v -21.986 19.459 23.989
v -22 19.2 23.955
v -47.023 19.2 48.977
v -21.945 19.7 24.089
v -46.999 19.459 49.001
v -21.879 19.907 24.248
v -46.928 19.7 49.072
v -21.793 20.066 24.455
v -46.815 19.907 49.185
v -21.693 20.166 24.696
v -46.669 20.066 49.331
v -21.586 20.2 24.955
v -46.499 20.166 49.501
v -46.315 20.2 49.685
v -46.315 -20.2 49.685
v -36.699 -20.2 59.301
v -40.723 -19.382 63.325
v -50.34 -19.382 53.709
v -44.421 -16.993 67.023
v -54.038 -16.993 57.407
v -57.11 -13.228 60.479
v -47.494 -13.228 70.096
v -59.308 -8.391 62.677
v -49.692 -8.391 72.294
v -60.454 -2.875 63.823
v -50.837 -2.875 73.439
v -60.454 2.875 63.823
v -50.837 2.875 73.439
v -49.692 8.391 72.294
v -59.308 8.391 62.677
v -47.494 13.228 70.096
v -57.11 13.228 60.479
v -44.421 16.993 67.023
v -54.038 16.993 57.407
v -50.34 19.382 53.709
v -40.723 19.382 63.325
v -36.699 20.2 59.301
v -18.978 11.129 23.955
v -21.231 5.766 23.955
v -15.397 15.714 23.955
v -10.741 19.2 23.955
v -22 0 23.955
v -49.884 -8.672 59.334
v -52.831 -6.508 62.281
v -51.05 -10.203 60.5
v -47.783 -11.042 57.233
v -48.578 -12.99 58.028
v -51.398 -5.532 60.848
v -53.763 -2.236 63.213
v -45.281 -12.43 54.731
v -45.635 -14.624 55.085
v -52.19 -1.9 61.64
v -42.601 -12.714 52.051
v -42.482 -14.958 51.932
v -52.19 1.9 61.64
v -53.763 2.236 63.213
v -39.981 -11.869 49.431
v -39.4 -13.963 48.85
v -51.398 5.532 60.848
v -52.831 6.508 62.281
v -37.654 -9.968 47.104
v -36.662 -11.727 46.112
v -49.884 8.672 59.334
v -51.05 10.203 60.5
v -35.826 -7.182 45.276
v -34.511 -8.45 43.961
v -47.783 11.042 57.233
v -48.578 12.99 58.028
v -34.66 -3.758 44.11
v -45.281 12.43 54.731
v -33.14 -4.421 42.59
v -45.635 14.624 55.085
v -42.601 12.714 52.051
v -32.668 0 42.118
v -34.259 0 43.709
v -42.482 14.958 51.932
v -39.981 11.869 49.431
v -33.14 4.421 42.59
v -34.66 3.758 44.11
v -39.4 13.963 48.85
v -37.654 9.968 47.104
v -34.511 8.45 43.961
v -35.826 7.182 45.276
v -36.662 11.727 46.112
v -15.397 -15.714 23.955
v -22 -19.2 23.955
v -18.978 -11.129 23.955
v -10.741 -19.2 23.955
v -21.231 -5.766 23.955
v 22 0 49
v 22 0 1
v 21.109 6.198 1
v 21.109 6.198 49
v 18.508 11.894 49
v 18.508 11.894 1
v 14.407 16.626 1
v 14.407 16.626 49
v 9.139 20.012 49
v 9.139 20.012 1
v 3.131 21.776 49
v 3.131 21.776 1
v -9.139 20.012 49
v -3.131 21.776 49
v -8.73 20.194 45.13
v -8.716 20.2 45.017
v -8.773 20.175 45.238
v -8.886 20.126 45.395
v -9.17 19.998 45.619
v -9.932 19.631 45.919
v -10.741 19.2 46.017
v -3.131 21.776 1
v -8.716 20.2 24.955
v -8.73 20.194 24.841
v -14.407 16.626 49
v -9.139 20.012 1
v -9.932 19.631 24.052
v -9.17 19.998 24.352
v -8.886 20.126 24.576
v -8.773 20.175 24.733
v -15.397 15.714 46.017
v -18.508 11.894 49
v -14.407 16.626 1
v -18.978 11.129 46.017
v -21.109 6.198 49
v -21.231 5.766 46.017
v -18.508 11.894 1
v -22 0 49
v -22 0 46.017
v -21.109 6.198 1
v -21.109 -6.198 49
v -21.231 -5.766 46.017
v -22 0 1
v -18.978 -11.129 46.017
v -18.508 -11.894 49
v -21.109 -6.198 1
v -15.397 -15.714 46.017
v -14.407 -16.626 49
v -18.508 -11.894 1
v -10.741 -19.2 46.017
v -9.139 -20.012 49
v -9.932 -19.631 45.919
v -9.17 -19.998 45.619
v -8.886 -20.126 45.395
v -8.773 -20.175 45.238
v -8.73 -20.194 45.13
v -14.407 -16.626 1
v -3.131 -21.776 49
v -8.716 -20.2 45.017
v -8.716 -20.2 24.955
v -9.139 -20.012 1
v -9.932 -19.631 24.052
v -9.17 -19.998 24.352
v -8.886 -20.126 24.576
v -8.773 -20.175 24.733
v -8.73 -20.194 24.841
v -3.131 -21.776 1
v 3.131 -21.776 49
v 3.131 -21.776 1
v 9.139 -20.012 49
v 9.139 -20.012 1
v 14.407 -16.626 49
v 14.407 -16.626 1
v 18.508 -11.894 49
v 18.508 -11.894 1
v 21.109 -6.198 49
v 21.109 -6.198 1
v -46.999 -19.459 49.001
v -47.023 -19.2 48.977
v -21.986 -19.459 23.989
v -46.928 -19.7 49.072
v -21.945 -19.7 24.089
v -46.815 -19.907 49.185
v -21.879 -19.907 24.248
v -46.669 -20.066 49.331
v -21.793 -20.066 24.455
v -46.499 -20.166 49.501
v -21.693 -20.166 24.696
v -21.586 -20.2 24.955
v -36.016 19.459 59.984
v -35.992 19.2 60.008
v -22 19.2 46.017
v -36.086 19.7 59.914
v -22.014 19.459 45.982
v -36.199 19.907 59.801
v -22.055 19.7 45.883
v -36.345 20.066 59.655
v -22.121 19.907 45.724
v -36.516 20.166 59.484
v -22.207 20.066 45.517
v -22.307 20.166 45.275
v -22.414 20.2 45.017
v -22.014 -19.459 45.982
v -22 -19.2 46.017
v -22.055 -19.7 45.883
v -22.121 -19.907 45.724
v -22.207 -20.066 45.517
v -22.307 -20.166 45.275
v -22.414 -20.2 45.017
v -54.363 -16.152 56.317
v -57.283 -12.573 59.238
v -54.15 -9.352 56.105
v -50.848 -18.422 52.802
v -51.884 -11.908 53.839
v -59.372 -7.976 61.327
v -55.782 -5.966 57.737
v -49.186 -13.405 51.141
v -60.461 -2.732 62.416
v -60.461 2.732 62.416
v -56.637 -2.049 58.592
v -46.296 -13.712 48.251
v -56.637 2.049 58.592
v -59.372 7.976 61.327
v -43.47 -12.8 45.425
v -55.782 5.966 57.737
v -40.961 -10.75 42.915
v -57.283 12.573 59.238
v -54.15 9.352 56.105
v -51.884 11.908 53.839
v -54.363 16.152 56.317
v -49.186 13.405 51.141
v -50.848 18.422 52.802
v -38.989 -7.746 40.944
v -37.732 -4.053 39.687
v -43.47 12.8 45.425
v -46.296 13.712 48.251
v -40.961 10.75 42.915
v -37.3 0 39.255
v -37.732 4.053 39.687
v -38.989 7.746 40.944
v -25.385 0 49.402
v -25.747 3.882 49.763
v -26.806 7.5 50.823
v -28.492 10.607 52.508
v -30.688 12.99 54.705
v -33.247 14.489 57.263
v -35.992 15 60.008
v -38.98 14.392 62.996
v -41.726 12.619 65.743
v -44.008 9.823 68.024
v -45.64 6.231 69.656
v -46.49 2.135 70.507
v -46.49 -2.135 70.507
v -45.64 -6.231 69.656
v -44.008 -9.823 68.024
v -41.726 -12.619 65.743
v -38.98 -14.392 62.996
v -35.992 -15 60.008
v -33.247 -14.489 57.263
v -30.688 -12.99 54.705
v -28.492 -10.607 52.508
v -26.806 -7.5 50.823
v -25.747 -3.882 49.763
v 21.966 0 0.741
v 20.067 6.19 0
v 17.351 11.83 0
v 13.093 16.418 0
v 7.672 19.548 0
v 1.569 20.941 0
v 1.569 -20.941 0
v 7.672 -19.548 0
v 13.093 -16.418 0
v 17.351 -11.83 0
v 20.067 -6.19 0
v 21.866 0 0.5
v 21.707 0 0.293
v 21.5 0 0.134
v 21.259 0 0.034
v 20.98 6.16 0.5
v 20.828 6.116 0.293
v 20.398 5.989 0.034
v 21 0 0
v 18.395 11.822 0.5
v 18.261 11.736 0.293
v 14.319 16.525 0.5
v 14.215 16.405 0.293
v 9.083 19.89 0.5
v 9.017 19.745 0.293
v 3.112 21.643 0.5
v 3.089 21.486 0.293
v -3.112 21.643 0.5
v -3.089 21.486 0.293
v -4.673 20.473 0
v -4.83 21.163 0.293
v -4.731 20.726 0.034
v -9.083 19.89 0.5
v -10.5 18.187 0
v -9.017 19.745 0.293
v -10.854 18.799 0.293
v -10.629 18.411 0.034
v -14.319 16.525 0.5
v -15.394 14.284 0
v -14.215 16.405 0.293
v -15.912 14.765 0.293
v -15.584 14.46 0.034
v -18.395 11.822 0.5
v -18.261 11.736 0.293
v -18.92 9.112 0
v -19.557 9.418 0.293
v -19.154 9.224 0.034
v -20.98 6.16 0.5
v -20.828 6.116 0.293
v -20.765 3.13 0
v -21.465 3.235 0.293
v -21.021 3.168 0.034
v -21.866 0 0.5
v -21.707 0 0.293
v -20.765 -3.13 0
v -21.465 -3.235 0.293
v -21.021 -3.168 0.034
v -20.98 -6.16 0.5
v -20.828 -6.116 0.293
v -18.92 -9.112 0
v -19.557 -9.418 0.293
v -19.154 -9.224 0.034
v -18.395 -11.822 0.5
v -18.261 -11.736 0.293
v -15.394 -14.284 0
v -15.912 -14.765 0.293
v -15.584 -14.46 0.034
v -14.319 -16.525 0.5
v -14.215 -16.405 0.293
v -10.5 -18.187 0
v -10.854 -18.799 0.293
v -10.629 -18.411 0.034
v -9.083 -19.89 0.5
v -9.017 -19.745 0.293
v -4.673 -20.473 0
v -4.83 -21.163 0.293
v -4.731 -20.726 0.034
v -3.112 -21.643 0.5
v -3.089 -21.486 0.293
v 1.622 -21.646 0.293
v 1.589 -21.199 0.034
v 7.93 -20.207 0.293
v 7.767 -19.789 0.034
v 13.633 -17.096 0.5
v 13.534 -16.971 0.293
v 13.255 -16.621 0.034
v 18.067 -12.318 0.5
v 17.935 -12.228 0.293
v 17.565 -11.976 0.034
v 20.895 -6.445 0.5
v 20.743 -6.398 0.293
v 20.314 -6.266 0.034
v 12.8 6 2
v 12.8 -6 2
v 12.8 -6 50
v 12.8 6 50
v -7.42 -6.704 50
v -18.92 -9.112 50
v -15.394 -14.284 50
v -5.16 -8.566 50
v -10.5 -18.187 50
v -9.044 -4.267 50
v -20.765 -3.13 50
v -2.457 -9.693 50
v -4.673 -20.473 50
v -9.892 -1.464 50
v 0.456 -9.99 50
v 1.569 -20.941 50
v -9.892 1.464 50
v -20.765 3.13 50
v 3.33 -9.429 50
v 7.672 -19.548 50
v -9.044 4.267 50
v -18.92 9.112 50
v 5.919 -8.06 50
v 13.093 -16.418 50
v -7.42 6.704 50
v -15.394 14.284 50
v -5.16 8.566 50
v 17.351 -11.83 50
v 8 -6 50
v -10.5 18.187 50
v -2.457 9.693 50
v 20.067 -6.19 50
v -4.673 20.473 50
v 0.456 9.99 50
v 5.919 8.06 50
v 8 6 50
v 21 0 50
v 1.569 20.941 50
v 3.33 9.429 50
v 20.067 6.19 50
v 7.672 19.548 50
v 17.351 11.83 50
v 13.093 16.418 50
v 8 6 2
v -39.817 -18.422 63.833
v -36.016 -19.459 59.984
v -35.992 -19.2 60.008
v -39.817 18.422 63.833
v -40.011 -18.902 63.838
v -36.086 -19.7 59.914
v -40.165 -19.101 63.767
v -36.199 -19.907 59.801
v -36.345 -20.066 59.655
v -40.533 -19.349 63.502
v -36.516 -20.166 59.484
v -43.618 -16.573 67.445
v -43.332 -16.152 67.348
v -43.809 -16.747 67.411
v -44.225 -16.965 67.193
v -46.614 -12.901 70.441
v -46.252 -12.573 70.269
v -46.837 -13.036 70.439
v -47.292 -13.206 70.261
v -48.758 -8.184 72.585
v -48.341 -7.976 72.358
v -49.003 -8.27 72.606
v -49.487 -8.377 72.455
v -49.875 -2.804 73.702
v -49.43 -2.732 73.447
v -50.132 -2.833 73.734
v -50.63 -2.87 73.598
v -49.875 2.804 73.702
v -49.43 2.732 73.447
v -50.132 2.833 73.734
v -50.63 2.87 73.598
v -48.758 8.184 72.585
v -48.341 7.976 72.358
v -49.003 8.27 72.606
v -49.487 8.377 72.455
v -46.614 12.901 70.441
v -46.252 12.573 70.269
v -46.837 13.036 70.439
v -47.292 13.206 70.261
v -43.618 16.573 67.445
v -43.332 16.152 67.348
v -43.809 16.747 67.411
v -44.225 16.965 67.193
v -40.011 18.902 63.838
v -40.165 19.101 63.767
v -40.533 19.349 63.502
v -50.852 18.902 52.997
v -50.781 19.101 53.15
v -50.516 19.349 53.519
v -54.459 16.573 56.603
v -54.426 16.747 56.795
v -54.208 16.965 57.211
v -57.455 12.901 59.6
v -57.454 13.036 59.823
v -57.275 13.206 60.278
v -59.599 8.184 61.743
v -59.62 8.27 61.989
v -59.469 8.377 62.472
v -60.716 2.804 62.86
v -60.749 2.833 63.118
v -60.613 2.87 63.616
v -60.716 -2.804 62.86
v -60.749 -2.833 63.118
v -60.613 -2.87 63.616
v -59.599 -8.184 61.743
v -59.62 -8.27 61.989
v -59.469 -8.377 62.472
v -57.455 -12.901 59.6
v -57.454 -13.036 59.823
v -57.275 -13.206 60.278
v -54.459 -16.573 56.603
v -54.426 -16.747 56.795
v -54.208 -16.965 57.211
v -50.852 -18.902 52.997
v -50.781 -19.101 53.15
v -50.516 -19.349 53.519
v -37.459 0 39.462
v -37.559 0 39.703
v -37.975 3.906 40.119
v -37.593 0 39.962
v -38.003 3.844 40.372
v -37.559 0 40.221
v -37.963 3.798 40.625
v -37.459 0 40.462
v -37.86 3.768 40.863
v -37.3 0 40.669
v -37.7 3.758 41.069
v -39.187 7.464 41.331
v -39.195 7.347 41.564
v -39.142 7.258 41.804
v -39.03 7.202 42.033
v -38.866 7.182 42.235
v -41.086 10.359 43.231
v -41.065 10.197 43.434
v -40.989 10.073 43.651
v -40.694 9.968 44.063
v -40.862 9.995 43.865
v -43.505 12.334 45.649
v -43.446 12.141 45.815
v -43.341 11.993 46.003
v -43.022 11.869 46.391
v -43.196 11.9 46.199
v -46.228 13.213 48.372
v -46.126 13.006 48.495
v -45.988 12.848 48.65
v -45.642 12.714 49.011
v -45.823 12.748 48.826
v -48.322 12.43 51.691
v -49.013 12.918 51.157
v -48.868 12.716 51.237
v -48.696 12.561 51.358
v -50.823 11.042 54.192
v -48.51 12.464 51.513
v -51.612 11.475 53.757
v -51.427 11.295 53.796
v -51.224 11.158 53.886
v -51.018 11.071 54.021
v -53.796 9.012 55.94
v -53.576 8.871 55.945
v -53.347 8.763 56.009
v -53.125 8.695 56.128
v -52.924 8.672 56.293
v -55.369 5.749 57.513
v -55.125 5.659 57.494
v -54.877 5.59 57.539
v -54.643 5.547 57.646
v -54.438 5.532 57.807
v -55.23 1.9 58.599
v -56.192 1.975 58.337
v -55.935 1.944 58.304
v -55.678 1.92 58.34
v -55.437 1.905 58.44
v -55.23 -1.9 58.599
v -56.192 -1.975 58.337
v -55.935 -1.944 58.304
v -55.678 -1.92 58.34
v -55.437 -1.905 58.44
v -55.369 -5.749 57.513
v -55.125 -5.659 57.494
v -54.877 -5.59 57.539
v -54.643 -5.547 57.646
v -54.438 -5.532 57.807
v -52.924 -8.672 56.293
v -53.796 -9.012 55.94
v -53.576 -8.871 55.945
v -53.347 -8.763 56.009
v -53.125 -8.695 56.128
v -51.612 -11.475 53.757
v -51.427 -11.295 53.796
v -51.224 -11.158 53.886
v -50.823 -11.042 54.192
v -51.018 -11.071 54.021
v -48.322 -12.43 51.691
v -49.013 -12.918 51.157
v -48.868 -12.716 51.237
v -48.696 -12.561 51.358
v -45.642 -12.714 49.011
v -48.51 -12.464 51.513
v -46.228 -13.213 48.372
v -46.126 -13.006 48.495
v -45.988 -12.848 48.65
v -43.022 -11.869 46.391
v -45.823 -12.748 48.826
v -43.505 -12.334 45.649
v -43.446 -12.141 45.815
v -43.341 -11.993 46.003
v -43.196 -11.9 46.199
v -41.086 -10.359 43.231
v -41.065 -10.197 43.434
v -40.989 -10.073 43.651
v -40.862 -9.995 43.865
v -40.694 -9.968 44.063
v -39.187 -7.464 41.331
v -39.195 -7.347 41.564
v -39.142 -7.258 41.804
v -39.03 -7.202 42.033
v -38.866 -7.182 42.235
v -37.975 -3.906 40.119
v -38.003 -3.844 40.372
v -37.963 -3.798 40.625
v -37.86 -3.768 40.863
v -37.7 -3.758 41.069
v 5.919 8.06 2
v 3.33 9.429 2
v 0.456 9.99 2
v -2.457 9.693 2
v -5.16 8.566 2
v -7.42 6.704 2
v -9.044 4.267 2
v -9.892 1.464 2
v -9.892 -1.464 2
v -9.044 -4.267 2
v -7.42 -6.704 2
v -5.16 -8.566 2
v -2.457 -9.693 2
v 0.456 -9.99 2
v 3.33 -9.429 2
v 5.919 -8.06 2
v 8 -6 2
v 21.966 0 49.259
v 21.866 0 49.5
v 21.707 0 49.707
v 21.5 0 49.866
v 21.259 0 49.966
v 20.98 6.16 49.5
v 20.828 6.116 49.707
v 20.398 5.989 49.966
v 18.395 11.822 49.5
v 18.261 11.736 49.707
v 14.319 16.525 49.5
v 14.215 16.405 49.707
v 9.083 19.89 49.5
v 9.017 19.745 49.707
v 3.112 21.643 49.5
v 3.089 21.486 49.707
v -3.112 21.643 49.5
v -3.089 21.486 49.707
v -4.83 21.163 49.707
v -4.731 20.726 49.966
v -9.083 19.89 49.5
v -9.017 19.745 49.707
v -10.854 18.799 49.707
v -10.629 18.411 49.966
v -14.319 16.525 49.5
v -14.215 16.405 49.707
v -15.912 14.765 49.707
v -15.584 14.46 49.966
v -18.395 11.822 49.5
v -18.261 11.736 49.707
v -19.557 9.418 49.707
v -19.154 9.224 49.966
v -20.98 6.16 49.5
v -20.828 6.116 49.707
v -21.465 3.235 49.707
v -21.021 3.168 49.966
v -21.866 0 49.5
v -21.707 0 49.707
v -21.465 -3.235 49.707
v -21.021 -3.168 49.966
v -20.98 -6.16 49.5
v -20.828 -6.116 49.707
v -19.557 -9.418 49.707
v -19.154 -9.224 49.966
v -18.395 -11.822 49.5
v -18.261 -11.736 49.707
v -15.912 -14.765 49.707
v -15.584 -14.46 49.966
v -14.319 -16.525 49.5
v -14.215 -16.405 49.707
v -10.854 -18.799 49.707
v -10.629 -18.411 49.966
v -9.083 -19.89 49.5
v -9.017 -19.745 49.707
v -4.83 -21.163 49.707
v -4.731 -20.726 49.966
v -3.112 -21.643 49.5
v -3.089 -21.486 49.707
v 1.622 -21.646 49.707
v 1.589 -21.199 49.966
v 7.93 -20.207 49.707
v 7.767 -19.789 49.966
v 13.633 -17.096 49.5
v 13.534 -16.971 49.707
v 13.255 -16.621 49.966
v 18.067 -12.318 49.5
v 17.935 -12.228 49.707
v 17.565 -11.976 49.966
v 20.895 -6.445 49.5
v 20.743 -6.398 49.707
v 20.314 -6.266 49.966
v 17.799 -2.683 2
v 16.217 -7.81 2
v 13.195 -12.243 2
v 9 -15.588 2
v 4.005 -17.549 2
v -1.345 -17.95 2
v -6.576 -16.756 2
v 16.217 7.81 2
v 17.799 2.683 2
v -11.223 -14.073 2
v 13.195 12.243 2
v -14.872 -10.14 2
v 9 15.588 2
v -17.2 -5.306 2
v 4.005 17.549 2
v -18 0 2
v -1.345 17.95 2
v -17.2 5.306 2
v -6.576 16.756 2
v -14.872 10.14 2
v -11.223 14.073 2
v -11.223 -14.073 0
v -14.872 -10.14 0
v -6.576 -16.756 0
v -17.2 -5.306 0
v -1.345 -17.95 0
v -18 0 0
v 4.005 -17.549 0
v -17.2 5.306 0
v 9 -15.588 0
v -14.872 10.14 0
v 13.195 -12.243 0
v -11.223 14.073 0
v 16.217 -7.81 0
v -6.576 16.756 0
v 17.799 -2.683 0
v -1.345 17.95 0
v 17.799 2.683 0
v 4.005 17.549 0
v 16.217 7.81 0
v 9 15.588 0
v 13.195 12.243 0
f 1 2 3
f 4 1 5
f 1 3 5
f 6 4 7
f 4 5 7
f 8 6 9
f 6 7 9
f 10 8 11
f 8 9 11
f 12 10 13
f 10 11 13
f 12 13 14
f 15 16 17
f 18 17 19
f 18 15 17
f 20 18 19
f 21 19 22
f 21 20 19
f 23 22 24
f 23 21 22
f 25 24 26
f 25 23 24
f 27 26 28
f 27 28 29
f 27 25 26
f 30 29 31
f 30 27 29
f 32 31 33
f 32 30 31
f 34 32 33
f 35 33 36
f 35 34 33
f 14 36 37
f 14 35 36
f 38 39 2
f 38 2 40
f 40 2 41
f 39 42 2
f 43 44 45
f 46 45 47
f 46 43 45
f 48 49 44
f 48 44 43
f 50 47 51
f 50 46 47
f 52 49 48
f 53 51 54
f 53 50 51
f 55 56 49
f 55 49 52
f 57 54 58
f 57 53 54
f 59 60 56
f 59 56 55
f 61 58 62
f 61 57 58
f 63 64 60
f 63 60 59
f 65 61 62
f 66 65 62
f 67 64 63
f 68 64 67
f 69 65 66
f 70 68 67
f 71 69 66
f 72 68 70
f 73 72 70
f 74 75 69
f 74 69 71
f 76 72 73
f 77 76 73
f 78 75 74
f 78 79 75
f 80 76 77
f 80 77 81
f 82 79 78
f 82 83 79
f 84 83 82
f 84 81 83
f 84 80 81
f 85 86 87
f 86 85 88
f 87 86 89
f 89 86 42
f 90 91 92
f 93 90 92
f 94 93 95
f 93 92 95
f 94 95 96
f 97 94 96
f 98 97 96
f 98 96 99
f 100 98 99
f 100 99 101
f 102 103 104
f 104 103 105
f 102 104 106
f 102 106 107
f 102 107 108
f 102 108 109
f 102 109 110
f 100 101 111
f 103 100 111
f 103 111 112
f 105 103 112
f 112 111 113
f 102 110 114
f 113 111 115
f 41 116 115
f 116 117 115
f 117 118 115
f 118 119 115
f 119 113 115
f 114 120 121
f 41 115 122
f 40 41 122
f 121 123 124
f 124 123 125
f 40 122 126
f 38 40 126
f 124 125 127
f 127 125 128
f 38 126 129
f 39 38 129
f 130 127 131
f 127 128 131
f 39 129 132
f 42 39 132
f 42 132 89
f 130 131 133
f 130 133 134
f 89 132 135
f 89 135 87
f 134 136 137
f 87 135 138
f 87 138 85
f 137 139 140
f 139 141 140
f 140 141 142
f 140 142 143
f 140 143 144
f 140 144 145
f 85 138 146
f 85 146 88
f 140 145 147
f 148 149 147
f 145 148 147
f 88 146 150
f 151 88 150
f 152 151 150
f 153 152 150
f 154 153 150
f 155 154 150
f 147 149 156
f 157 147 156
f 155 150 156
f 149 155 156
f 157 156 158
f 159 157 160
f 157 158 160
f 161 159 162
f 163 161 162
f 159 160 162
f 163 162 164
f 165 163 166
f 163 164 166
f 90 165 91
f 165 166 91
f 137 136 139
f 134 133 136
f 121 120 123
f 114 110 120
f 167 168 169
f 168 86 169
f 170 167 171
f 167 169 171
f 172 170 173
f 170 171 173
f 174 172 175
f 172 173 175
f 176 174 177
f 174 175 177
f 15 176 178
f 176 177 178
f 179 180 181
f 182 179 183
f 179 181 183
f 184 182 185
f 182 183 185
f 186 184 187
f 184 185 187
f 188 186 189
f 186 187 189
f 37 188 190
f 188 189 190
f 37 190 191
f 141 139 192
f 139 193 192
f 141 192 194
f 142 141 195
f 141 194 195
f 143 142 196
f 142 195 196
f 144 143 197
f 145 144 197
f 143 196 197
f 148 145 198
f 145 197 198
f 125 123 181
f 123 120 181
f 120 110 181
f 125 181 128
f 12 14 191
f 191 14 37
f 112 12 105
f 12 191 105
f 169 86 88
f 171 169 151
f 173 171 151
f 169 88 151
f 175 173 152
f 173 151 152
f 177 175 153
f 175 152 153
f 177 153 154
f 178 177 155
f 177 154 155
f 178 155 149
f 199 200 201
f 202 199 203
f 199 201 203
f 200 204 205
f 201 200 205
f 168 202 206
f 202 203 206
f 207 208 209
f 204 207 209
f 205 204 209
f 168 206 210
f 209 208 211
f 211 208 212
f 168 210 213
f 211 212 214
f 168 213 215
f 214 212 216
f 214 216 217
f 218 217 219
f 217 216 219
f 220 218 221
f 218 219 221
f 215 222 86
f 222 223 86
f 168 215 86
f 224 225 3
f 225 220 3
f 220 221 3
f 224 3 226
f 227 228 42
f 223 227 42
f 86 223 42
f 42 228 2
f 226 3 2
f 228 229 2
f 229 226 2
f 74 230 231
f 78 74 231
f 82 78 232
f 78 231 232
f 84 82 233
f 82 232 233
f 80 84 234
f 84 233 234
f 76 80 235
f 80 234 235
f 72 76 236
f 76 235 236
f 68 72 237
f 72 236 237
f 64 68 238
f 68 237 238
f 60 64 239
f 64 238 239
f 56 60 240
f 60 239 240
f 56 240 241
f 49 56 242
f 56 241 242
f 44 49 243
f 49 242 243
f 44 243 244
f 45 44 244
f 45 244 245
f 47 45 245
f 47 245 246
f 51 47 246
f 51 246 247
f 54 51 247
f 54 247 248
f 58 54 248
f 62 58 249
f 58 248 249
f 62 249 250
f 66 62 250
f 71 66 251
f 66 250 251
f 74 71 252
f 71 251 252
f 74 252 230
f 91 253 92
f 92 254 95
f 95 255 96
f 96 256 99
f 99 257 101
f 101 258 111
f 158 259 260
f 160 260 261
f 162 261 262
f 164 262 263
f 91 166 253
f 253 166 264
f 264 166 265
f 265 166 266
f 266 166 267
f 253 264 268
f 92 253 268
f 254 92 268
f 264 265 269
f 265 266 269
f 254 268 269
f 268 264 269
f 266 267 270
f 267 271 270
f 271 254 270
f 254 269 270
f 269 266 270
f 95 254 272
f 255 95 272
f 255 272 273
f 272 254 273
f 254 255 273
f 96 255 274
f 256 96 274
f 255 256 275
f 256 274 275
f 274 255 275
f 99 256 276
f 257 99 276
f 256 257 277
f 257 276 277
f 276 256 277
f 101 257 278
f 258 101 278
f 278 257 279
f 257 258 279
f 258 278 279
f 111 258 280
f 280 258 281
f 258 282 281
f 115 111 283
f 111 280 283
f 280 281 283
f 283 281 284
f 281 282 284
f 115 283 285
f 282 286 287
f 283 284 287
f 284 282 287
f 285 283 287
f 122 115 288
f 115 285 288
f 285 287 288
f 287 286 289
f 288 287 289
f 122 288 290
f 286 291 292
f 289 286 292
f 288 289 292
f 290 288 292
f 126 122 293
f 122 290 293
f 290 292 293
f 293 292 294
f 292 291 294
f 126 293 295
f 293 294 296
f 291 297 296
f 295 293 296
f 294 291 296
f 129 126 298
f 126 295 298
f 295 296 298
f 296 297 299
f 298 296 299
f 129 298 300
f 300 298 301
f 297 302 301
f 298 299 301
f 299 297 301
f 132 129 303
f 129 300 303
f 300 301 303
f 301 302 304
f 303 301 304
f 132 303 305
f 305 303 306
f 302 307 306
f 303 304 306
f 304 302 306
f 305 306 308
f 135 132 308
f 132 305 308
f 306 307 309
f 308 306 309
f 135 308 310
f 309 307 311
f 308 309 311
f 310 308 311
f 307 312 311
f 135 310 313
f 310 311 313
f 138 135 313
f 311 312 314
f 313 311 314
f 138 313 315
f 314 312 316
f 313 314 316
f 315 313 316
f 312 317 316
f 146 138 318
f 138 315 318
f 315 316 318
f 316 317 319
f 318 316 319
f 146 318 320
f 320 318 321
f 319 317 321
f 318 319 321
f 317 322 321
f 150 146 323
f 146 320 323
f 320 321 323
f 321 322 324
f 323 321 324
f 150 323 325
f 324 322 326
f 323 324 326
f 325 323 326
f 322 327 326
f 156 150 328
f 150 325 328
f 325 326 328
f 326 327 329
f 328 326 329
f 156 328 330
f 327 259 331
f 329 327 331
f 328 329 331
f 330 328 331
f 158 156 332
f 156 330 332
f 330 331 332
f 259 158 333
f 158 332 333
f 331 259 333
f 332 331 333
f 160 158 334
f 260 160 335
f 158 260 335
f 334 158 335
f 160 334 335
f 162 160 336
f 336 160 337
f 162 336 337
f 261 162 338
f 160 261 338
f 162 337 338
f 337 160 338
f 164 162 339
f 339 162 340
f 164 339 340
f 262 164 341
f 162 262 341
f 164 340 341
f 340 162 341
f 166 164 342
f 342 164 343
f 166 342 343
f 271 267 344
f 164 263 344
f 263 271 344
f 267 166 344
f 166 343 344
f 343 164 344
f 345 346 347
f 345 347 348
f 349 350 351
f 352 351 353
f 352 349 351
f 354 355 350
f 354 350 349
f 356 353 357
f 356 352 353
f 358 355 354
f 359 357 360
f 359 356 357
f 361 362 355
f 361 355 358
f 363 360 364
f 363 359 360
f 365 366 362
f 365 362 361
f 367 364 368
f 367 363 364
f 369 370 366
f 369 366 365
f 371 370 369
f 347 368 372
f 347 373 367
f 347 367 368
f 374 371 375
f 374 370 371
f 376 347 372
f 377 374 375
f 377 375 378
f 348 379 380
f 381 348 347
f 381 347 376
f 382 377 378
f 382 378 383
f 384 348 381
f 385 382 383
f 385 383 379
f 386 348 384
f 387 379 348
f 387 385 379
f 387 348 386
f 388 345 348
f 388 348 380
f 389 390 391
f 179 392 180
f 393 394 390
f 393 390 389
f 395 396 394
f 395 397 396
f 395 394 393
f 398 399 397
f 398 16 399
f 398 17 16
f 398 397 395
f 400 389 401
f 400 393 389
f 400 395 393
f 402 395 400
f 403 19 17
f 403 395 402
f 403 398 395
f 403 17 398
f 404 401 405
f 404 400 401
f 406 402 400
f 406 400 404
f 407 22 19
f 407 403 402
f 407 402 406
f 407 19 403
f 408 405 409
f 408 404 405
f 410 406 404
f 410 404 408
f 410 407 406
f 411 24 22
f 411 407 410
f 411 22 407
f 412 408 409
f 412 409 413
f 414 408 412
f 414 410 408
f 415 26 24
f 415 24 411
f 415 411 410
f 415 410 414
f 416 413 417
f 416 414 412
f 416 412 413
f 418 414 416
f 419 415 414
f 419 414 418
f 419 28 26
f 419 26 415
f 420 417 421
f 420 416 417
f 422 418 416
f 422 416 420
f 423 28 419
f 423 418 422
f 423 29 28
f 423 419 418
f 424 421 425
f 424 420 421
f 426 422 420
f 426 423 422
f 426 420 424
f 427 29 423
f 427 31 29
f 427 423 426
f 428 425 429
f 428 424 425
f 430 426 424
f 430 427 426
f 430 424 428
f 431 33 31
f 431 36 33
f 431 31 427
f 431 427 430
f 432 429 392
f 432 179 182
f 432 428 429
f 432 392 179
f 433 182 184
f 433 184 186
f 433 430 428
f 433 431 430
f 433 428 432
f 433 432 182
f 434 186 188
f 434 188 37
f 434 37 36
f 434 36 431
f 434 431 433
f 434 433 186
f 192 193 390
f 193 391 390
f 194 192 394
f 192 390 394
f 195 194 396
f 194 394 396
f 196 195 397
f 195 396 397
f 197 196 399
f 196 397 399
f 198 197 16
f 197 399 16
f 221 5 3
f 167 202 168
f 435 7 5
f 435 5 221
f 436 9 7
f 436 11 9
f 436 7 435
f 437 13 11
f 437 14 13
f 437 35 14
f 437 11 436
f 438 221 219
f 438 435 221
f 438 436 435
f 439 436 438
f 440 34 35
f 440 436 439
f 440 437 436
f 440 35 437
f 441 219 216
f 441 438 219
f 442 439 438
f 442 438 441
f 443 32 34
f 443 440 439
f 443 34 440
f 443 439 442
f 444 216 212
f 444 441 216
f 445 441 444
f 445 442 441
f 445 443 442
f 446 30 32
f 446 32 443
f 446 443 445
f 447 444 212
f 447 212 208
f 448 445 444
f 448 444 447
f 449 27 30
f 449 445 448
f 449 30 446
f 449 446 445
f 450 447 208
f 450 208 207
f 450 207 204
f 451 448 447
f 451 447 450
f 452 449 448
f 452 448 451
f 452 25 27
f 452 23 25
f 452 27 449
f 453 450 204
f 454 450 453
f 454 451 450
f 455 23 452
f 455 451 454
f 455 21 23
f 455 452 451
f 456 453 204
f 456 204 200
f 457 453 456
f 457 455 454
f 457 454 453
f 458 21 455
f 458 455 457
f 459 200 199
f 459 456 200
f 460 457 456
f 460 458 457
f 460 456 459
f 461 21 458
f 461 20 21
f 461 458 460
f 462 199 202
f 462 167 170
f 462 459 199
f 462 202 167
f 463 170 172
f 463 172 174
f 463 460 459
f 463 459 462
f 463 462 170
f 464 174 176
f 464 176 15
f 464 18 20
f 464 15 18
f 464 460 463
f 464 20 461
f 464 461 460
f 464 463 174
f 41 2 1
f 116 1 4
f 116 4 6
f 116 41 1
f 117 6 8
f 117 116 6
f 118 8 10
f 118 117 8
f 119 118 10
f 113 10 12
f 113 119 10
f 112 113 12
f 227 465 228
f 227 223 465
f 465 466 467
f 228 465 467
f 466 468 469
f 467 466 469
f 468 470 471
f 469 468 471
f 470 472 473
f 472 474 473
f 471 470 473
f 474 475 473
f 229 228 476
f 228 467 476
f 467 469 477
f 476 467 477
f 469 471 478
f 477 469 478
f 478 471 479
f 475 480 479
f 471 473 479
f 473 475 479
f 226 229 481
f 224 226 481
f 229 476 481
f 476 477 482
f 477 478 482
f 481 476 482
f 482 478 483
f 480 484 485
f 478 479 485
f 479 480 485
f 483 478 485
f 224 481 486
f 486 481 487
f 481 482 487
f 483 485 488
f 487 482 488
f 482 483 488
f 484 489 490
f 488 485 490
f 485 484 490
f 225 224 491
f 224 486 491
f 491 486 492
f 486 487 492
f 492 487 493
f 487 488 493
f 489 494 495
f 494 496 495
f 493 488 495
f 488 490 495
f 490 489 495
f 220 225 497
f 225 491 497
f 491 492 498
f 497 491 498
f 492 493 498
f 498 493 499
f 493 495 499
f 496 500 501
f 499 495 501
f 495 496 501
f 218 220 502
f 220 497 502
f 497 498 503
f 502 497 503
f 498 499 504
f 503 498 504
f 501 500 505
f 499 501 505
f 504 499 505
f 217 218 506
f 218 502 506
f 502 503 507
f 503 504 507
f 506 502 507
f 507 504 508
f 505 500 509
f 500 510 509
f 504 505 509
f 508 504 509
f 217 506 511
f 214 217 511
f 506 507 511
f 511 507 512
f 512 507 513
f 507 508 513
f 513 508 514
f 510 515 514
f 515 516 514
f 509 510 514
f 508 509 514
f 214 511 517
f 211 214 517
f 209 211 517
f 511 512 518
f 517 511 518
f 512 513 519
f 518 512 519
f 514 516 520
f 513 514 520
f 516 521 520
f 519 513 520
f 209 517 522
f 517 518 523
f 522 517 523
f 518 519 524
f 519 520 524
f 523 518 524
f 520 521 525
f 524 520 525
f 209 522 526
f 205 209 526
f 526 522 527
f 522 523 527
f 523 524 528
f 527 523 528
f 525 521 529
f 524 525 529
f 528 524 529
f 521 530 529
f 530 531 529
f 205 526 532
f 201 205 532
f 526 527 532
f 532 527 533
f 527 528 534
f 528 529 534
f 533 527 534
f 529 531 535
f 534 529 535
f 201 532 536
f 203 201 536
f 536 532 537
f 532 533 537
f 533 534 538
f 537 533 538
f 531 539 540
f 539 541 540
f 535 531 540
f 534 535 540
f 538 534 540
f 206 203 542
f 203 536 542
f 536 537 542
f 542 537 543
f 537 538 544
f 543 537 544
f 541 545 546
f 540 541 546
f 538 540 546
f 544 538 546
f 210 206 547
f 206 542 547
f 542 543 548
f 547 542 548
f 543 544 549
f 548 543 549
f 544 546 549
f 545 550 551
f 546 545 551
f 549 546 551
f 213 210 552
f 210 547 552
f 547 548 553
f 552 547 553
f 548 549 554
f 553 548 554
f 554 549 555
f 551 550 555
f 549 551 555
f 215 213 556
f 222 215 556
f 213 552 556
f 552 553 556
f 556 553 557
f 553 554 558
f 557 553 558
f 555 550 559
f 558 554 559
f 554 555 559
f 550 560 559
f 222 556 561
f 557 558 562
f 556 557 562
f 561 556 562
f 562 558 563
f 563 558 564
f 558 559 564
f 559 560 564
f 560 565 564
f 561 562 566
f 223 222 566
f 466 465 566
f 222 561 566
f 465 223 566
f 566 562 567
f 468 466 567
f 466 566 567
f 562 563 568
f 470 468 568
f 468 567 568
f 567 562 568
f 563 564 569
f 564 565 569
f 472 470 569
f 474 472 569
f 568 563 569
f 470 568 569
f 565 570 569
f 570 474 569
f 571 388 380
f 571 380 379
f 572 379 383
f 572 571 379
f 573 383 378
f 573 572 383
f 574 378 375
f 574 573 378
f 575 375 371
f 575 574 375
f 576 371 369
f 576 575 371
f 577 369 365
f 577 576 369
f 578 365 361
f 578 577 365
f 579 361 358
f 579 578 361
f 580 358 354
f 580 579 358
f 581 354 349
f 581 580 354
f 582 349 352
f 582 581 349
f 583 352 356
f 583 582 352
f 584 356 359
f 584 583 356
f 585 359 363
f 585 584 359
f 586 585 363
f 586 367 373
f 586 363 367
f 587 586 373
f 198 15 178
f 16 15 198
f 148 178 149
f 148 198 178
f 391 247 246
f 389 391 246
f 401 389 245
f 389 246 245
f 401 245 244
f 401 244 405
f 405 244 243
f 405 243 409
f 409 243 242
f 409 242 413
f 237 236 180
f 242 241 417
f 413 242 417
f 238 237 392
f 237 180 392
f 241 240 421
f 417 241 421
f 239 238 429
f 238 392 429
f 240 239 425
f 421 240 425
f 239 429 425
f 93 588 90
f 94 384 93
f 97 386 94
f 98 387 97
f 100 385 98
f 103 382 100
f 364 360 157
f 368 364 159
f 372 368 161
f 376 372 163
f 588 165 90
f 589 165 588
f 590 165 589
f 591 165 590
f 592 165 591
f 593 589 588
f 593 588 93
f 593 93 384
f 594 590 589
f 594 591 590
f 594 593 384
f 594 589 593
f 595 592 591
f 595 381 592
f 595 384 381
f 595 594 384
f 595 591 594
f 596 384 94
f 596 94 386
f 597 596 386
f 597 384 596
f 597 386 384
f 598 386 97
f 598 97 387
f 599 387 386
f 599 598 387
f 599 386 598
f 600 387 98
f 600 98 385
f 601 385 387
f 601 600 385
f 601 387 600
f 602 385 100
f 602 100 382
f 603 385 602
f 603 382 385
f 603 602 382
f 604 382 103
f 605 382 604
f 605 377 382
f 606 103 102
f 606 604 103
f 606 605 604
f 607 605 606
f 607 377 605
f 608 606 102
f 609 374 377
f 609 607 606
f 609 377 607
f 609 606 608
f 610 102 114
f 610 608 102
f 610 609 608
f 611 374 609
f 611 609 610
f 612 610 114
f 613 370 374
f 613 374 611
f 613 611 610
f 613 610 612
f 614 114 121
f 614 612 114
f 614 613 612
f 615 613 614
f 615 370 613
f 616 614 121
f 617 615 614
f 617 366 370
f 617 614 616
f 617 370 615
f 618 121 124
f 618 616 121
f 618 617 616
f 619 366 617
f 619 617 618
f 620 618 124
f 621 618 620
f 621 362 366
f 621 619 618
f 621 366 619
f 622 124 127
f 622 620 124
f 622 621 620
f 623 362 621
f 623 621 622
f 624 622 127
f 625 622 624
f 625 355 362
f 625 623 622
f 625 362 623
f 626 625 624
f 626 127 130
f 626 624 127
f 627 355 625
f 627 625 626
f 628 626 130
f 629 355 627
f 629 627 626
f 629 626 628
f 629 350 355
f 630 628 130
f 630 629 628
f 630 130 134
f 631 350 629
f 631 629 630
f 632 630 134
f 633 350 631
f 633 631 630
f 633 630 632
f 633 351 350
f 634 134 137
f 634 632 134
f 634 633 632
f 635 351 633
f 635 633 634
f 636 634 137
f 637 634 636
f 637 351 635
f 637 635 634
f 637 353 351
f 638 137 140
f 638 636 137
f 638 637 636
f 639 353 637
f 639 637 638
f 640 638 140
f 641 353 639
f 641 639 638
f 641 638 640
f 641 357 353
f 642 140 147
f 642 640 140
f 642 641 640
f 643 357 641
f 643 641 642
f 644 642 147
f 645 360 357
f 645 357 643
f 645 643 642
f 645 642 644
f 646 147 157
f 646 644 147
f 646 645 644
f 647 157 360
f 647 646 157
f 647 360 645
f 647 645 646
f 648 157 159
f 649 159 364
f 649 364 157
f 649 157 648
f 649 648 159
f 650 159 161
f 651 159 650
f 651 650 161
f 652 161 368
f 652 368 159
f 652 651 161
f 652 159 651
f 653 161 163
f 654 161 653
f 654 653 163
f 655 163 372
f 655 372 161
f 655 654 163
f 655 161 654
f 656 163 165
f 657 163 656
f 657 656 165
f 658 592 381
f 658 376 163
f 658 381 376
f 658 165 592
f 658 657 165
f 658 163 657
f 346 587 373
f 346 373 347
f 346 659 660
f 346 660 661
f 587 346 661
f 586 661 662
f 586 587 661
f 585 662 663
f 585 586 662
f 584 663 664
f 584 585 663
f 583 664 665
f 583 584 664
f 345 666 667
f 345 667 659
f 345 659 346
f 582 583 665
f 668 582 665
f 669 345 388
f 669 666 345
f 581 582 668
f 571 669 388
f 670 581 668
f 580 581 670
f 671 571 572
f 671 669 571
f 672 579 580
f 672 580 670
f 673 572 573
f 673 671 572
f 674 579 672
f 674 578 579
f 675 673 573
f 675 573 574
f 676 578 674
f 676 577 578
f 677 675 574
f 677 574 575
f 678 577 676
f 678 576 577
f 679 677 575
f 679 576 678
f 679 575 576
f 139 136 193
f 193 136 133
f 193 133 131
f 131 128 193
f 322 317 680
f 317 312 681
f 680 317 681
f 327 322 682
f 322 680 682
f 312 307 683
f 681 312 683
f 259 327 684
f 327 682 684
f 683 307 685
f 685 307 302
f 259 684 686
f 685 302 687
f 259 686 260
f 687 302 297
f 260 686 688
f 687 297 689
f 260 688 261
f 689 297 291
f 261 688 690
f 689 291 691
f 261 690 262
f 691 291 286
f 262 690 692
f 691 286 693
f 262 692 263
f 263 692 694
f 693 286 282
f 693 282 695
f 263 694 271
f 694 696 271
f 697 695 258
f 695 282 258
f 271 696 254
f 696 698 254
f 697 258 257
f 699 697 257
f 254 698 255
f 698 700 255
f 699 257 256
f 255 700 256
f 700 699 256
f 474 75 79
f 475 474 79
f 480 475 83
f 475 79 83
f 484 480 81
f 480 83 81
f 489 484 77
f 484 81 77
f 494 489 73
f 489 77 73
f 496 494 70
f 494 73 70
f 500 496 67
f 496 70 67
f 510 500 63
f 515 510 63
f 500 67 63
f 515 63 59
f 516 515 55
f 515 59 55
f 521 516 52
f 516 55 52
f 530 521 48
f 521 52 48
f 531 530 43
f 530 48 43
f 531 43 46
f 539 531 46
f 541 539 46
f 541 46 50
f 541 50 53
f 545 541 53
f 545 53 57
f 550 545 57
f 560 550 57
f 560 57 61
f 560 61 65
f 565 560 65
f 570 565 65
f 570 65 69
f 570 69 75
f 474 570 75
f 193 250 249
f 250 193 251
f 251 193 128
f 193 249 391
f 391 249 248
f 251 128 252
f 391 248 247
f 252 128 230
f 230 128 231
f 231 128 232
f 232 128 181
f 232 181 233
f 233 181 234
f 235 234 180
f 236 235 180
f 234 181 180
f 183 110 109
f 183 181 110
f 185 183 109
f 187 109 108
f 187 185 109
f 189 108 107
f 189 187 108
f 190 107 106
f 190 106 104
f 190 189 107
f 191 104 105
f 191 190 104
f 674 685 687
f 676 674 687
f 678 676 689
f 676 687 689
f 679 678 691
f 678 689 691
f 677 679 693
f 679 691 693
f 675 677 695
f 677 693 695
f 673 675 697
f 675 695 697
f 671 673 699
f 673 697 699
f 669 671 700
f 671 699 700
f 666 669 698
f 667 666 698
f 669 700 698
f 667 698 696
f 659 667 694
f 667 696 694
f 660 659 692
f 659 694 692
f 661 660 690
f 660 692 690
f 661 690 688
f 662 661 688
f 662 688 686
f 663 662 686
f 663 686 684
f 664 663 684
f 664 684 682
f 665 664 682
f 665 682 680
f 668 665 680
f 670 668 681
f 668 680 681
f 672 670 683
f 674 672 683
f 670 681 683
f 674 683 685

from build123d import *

# Parameters (mm, degrees)
ESQUISSE1_R             = 22
BOSS_EXTRU_1_DEPTH      = 50
BOSS_EXTRU_3_DEPTH      = 20.2
BOSS_EXTRU_3_DEPTH_BACK = 20.2
ENL_V_MAT_EXTRU_1_REACH = 100.801
ESQUISSE6_R             = 15
ENL_V_MAT_EXTRU_2_DEPTH = 10.3
ENL_V_MAT_EXTRU_3_REACH = 100.406
ESQUISSE7_R             = 12.75
CONG_1_R                = 1
ESQUISSE8_R             = 18
ENL_V_MAT_EXTRU_4_DEPTH = 2
ENL_V_START             = -15.6
ENL_V_MAT_EXTRU_5_DEPTH = 15.6
CONG_5_R                = 1


with BuildPart() as part:
    # Esquisse1 → Boss.-Extru.1 (new body)
    with BuildSketch(Plane.XY):
        Circle(ESQUISSE1_R)
    extrude(amount=BOSS_EXTRU_1_DEPTH)

    # Esquisse4 → Boss.-Extru.3 (add, two sides: drawn at the far end of the back side and taken through both)
    with BuildSketch(Plane.XZ.offset(-BOSS_EXTRU_3_DEPTH_BACK)):
        Polygon((-35.991735162, 60.008264838), (-50.275292142, 74.291821818), (-61.306157929, 63.260956031), (-22, 23.954798102), (0, 23.954798102), (0, 46.016529675), (-22, 46.016529675), align=None)
    extrude(amount=BOSS_EXTRU_3_DEPTH + BOSS_EXTRU_3_DEPTH_BACK)

    # Esquisse5 → Enlèv. mat.-Extru.1 (cut, up to next)
    with BuildSketch(Plane(origin=(0, 0, 0), x_dir=(-1, 0, 0), z_dir=(0, 0, -1)), mode=Mode.PRIVATE) as enl_v_mat_extru_1_sk1:
        with BuildLine():
            Line((-12.8, -6), (-12.8, 6))
            Line((-12.8, 6), (-8, 6))
            ThreePointArc((-8, 6), (10, 0), (-8, -6))
            Line((-8, -6), (-12.8, -6))
        make_face()
    enl_v_mat_extru_1_tool1 = extrude(enl_v_mat_extru_1_sk1.sketch, amount=-ENL_V_MAT_EXTRU_1_REACH, mode=Mode.PRIVATE) & part.part
    add(enl_v_mat_extru_1_tool1.solids().sort_by_distance((1.280327, 0, 0))[0], mode=Mode.SUBTRACT)

    # Esquisse6 → Enlèv. mat.-Extru.2 (cut)
    with BuildSketch(Plane(origin=(12.008264838, 0, 12.008264838), x_dir=(0.7071067811865508, 0, -0.7071067811865444), z_dir=(0.7071067811865444, 0, 0.7071067811865508))):
        with Locations((-67.882250994, 0)):
            Circle(ESQUISSE6_R)
    extrude(amount=-ENL_V_MAT_EXTRU_2_DEPTH, mode=Mode.SUBTRACT)

    # Esquisse7 → Enlèv. mat.-Extru.3 (cut, up to next)
    with BuildSketch(Plane(origin=(4.725064991, 0, 4.725064991), x_dir=(0.7071067811865507, 0, -0.7071067811865445), z_dir=(0.7071067811865445, 0, 0.7071067811865507)), mode=Mode.PRIVATE) as enl_v_mat_extru_3_sk1:
        with Locations((-67.882250994, 0)):
            Circle(ESQUISSE7_R)
    enl_v_mat_extru_3_tool1 = extrude(enl_v_mat_extru_3_sk1.sketch, amount=-ENL_V_MAT_EXTRU_3_REACH, mode=Mode.PRIVATE) & part.part
    add(enl_v_mat_extru_3_tool1.solids().sort_by_distance((-43.274935, 0, 52.725065))[0], mode=Mode.SUBTRACT)

    # Congé1
    cong_1_edges = [part.edges().sort_by_distance(p)[0] for p in [
        (-56.038212409, 0, 57.993010511),
    ]]
    fillet(cong_1_edges, radius=CONG_1_R)

    # Esquisse8 → Enlèv. mat.-Extru.4 (cut)
    with BuildSketch(Plane(origin=(0, 0, 0), x_dir=(-1, 0, 0), z_dir=(0, 0, -1))):
        Circle(ESQUISSE8_R)
    extrude(amount=-ENL_V_MAT_EXTRU_4_DEPTH, mode=Mode.SUBTRACT)

    # Esquisse10 → Enlèv. mat.-Extru.5 (cut)
    with BuildSketch(Plane(origin=(12.008264838, 0, 12.008264838), x_dir=(0.7071067811865509, 0, -0.7071067811865442), z_dir=(0.7071067811865442, 0, 0.7071067811865509)).offset(ENL_V_START)):
        with BuildLine():
            Line((-67.882250994, 20.2), (-92.882250994, 20.2))
            Line((-92.882250994, 20.2), (-92.882250994, -20.2))
            Line((-92.882250994, -20.2), (-67.882250994, -20.2))
            ThreePointArc((-67.882250994, -20.2), (-88.082250994, 0), (-67.882250994, 20.2))
        make_face()
    extrude(amount=ENL_V_MAT_EXTRU_5_DEPTH, mode=Mode.SUBTRACT)

    # Congé5
    cong_5_edges = [part.edges().sort_by_distance(p)[0] for p in [
        (-15.357751714, 20.2, 23.954798102),
        (-15.357751714, -20.2, 23.954798102),
        (-15.357751714, -20.2, 46.016529675),
        (-28.995867581, -20.2, 53.012397256),
        (-28.995867581, 20.2, 53.012397256),
        (-22, 0, 0),
        (-22, 0, 50),
        (-34.511300474, -20.2, 36.466098577),
        (-50.275292142, 0, 74.291821818),
        (-61.306157929, 0, 63.260956031),
        (-34.511300474, 20.2, 36.466098577),
        (-15.357751714, 20.2, 46.016529675),
    ]]
    fillet(cong_5_edges, radius=CONG_5_R)


solid = part.part
